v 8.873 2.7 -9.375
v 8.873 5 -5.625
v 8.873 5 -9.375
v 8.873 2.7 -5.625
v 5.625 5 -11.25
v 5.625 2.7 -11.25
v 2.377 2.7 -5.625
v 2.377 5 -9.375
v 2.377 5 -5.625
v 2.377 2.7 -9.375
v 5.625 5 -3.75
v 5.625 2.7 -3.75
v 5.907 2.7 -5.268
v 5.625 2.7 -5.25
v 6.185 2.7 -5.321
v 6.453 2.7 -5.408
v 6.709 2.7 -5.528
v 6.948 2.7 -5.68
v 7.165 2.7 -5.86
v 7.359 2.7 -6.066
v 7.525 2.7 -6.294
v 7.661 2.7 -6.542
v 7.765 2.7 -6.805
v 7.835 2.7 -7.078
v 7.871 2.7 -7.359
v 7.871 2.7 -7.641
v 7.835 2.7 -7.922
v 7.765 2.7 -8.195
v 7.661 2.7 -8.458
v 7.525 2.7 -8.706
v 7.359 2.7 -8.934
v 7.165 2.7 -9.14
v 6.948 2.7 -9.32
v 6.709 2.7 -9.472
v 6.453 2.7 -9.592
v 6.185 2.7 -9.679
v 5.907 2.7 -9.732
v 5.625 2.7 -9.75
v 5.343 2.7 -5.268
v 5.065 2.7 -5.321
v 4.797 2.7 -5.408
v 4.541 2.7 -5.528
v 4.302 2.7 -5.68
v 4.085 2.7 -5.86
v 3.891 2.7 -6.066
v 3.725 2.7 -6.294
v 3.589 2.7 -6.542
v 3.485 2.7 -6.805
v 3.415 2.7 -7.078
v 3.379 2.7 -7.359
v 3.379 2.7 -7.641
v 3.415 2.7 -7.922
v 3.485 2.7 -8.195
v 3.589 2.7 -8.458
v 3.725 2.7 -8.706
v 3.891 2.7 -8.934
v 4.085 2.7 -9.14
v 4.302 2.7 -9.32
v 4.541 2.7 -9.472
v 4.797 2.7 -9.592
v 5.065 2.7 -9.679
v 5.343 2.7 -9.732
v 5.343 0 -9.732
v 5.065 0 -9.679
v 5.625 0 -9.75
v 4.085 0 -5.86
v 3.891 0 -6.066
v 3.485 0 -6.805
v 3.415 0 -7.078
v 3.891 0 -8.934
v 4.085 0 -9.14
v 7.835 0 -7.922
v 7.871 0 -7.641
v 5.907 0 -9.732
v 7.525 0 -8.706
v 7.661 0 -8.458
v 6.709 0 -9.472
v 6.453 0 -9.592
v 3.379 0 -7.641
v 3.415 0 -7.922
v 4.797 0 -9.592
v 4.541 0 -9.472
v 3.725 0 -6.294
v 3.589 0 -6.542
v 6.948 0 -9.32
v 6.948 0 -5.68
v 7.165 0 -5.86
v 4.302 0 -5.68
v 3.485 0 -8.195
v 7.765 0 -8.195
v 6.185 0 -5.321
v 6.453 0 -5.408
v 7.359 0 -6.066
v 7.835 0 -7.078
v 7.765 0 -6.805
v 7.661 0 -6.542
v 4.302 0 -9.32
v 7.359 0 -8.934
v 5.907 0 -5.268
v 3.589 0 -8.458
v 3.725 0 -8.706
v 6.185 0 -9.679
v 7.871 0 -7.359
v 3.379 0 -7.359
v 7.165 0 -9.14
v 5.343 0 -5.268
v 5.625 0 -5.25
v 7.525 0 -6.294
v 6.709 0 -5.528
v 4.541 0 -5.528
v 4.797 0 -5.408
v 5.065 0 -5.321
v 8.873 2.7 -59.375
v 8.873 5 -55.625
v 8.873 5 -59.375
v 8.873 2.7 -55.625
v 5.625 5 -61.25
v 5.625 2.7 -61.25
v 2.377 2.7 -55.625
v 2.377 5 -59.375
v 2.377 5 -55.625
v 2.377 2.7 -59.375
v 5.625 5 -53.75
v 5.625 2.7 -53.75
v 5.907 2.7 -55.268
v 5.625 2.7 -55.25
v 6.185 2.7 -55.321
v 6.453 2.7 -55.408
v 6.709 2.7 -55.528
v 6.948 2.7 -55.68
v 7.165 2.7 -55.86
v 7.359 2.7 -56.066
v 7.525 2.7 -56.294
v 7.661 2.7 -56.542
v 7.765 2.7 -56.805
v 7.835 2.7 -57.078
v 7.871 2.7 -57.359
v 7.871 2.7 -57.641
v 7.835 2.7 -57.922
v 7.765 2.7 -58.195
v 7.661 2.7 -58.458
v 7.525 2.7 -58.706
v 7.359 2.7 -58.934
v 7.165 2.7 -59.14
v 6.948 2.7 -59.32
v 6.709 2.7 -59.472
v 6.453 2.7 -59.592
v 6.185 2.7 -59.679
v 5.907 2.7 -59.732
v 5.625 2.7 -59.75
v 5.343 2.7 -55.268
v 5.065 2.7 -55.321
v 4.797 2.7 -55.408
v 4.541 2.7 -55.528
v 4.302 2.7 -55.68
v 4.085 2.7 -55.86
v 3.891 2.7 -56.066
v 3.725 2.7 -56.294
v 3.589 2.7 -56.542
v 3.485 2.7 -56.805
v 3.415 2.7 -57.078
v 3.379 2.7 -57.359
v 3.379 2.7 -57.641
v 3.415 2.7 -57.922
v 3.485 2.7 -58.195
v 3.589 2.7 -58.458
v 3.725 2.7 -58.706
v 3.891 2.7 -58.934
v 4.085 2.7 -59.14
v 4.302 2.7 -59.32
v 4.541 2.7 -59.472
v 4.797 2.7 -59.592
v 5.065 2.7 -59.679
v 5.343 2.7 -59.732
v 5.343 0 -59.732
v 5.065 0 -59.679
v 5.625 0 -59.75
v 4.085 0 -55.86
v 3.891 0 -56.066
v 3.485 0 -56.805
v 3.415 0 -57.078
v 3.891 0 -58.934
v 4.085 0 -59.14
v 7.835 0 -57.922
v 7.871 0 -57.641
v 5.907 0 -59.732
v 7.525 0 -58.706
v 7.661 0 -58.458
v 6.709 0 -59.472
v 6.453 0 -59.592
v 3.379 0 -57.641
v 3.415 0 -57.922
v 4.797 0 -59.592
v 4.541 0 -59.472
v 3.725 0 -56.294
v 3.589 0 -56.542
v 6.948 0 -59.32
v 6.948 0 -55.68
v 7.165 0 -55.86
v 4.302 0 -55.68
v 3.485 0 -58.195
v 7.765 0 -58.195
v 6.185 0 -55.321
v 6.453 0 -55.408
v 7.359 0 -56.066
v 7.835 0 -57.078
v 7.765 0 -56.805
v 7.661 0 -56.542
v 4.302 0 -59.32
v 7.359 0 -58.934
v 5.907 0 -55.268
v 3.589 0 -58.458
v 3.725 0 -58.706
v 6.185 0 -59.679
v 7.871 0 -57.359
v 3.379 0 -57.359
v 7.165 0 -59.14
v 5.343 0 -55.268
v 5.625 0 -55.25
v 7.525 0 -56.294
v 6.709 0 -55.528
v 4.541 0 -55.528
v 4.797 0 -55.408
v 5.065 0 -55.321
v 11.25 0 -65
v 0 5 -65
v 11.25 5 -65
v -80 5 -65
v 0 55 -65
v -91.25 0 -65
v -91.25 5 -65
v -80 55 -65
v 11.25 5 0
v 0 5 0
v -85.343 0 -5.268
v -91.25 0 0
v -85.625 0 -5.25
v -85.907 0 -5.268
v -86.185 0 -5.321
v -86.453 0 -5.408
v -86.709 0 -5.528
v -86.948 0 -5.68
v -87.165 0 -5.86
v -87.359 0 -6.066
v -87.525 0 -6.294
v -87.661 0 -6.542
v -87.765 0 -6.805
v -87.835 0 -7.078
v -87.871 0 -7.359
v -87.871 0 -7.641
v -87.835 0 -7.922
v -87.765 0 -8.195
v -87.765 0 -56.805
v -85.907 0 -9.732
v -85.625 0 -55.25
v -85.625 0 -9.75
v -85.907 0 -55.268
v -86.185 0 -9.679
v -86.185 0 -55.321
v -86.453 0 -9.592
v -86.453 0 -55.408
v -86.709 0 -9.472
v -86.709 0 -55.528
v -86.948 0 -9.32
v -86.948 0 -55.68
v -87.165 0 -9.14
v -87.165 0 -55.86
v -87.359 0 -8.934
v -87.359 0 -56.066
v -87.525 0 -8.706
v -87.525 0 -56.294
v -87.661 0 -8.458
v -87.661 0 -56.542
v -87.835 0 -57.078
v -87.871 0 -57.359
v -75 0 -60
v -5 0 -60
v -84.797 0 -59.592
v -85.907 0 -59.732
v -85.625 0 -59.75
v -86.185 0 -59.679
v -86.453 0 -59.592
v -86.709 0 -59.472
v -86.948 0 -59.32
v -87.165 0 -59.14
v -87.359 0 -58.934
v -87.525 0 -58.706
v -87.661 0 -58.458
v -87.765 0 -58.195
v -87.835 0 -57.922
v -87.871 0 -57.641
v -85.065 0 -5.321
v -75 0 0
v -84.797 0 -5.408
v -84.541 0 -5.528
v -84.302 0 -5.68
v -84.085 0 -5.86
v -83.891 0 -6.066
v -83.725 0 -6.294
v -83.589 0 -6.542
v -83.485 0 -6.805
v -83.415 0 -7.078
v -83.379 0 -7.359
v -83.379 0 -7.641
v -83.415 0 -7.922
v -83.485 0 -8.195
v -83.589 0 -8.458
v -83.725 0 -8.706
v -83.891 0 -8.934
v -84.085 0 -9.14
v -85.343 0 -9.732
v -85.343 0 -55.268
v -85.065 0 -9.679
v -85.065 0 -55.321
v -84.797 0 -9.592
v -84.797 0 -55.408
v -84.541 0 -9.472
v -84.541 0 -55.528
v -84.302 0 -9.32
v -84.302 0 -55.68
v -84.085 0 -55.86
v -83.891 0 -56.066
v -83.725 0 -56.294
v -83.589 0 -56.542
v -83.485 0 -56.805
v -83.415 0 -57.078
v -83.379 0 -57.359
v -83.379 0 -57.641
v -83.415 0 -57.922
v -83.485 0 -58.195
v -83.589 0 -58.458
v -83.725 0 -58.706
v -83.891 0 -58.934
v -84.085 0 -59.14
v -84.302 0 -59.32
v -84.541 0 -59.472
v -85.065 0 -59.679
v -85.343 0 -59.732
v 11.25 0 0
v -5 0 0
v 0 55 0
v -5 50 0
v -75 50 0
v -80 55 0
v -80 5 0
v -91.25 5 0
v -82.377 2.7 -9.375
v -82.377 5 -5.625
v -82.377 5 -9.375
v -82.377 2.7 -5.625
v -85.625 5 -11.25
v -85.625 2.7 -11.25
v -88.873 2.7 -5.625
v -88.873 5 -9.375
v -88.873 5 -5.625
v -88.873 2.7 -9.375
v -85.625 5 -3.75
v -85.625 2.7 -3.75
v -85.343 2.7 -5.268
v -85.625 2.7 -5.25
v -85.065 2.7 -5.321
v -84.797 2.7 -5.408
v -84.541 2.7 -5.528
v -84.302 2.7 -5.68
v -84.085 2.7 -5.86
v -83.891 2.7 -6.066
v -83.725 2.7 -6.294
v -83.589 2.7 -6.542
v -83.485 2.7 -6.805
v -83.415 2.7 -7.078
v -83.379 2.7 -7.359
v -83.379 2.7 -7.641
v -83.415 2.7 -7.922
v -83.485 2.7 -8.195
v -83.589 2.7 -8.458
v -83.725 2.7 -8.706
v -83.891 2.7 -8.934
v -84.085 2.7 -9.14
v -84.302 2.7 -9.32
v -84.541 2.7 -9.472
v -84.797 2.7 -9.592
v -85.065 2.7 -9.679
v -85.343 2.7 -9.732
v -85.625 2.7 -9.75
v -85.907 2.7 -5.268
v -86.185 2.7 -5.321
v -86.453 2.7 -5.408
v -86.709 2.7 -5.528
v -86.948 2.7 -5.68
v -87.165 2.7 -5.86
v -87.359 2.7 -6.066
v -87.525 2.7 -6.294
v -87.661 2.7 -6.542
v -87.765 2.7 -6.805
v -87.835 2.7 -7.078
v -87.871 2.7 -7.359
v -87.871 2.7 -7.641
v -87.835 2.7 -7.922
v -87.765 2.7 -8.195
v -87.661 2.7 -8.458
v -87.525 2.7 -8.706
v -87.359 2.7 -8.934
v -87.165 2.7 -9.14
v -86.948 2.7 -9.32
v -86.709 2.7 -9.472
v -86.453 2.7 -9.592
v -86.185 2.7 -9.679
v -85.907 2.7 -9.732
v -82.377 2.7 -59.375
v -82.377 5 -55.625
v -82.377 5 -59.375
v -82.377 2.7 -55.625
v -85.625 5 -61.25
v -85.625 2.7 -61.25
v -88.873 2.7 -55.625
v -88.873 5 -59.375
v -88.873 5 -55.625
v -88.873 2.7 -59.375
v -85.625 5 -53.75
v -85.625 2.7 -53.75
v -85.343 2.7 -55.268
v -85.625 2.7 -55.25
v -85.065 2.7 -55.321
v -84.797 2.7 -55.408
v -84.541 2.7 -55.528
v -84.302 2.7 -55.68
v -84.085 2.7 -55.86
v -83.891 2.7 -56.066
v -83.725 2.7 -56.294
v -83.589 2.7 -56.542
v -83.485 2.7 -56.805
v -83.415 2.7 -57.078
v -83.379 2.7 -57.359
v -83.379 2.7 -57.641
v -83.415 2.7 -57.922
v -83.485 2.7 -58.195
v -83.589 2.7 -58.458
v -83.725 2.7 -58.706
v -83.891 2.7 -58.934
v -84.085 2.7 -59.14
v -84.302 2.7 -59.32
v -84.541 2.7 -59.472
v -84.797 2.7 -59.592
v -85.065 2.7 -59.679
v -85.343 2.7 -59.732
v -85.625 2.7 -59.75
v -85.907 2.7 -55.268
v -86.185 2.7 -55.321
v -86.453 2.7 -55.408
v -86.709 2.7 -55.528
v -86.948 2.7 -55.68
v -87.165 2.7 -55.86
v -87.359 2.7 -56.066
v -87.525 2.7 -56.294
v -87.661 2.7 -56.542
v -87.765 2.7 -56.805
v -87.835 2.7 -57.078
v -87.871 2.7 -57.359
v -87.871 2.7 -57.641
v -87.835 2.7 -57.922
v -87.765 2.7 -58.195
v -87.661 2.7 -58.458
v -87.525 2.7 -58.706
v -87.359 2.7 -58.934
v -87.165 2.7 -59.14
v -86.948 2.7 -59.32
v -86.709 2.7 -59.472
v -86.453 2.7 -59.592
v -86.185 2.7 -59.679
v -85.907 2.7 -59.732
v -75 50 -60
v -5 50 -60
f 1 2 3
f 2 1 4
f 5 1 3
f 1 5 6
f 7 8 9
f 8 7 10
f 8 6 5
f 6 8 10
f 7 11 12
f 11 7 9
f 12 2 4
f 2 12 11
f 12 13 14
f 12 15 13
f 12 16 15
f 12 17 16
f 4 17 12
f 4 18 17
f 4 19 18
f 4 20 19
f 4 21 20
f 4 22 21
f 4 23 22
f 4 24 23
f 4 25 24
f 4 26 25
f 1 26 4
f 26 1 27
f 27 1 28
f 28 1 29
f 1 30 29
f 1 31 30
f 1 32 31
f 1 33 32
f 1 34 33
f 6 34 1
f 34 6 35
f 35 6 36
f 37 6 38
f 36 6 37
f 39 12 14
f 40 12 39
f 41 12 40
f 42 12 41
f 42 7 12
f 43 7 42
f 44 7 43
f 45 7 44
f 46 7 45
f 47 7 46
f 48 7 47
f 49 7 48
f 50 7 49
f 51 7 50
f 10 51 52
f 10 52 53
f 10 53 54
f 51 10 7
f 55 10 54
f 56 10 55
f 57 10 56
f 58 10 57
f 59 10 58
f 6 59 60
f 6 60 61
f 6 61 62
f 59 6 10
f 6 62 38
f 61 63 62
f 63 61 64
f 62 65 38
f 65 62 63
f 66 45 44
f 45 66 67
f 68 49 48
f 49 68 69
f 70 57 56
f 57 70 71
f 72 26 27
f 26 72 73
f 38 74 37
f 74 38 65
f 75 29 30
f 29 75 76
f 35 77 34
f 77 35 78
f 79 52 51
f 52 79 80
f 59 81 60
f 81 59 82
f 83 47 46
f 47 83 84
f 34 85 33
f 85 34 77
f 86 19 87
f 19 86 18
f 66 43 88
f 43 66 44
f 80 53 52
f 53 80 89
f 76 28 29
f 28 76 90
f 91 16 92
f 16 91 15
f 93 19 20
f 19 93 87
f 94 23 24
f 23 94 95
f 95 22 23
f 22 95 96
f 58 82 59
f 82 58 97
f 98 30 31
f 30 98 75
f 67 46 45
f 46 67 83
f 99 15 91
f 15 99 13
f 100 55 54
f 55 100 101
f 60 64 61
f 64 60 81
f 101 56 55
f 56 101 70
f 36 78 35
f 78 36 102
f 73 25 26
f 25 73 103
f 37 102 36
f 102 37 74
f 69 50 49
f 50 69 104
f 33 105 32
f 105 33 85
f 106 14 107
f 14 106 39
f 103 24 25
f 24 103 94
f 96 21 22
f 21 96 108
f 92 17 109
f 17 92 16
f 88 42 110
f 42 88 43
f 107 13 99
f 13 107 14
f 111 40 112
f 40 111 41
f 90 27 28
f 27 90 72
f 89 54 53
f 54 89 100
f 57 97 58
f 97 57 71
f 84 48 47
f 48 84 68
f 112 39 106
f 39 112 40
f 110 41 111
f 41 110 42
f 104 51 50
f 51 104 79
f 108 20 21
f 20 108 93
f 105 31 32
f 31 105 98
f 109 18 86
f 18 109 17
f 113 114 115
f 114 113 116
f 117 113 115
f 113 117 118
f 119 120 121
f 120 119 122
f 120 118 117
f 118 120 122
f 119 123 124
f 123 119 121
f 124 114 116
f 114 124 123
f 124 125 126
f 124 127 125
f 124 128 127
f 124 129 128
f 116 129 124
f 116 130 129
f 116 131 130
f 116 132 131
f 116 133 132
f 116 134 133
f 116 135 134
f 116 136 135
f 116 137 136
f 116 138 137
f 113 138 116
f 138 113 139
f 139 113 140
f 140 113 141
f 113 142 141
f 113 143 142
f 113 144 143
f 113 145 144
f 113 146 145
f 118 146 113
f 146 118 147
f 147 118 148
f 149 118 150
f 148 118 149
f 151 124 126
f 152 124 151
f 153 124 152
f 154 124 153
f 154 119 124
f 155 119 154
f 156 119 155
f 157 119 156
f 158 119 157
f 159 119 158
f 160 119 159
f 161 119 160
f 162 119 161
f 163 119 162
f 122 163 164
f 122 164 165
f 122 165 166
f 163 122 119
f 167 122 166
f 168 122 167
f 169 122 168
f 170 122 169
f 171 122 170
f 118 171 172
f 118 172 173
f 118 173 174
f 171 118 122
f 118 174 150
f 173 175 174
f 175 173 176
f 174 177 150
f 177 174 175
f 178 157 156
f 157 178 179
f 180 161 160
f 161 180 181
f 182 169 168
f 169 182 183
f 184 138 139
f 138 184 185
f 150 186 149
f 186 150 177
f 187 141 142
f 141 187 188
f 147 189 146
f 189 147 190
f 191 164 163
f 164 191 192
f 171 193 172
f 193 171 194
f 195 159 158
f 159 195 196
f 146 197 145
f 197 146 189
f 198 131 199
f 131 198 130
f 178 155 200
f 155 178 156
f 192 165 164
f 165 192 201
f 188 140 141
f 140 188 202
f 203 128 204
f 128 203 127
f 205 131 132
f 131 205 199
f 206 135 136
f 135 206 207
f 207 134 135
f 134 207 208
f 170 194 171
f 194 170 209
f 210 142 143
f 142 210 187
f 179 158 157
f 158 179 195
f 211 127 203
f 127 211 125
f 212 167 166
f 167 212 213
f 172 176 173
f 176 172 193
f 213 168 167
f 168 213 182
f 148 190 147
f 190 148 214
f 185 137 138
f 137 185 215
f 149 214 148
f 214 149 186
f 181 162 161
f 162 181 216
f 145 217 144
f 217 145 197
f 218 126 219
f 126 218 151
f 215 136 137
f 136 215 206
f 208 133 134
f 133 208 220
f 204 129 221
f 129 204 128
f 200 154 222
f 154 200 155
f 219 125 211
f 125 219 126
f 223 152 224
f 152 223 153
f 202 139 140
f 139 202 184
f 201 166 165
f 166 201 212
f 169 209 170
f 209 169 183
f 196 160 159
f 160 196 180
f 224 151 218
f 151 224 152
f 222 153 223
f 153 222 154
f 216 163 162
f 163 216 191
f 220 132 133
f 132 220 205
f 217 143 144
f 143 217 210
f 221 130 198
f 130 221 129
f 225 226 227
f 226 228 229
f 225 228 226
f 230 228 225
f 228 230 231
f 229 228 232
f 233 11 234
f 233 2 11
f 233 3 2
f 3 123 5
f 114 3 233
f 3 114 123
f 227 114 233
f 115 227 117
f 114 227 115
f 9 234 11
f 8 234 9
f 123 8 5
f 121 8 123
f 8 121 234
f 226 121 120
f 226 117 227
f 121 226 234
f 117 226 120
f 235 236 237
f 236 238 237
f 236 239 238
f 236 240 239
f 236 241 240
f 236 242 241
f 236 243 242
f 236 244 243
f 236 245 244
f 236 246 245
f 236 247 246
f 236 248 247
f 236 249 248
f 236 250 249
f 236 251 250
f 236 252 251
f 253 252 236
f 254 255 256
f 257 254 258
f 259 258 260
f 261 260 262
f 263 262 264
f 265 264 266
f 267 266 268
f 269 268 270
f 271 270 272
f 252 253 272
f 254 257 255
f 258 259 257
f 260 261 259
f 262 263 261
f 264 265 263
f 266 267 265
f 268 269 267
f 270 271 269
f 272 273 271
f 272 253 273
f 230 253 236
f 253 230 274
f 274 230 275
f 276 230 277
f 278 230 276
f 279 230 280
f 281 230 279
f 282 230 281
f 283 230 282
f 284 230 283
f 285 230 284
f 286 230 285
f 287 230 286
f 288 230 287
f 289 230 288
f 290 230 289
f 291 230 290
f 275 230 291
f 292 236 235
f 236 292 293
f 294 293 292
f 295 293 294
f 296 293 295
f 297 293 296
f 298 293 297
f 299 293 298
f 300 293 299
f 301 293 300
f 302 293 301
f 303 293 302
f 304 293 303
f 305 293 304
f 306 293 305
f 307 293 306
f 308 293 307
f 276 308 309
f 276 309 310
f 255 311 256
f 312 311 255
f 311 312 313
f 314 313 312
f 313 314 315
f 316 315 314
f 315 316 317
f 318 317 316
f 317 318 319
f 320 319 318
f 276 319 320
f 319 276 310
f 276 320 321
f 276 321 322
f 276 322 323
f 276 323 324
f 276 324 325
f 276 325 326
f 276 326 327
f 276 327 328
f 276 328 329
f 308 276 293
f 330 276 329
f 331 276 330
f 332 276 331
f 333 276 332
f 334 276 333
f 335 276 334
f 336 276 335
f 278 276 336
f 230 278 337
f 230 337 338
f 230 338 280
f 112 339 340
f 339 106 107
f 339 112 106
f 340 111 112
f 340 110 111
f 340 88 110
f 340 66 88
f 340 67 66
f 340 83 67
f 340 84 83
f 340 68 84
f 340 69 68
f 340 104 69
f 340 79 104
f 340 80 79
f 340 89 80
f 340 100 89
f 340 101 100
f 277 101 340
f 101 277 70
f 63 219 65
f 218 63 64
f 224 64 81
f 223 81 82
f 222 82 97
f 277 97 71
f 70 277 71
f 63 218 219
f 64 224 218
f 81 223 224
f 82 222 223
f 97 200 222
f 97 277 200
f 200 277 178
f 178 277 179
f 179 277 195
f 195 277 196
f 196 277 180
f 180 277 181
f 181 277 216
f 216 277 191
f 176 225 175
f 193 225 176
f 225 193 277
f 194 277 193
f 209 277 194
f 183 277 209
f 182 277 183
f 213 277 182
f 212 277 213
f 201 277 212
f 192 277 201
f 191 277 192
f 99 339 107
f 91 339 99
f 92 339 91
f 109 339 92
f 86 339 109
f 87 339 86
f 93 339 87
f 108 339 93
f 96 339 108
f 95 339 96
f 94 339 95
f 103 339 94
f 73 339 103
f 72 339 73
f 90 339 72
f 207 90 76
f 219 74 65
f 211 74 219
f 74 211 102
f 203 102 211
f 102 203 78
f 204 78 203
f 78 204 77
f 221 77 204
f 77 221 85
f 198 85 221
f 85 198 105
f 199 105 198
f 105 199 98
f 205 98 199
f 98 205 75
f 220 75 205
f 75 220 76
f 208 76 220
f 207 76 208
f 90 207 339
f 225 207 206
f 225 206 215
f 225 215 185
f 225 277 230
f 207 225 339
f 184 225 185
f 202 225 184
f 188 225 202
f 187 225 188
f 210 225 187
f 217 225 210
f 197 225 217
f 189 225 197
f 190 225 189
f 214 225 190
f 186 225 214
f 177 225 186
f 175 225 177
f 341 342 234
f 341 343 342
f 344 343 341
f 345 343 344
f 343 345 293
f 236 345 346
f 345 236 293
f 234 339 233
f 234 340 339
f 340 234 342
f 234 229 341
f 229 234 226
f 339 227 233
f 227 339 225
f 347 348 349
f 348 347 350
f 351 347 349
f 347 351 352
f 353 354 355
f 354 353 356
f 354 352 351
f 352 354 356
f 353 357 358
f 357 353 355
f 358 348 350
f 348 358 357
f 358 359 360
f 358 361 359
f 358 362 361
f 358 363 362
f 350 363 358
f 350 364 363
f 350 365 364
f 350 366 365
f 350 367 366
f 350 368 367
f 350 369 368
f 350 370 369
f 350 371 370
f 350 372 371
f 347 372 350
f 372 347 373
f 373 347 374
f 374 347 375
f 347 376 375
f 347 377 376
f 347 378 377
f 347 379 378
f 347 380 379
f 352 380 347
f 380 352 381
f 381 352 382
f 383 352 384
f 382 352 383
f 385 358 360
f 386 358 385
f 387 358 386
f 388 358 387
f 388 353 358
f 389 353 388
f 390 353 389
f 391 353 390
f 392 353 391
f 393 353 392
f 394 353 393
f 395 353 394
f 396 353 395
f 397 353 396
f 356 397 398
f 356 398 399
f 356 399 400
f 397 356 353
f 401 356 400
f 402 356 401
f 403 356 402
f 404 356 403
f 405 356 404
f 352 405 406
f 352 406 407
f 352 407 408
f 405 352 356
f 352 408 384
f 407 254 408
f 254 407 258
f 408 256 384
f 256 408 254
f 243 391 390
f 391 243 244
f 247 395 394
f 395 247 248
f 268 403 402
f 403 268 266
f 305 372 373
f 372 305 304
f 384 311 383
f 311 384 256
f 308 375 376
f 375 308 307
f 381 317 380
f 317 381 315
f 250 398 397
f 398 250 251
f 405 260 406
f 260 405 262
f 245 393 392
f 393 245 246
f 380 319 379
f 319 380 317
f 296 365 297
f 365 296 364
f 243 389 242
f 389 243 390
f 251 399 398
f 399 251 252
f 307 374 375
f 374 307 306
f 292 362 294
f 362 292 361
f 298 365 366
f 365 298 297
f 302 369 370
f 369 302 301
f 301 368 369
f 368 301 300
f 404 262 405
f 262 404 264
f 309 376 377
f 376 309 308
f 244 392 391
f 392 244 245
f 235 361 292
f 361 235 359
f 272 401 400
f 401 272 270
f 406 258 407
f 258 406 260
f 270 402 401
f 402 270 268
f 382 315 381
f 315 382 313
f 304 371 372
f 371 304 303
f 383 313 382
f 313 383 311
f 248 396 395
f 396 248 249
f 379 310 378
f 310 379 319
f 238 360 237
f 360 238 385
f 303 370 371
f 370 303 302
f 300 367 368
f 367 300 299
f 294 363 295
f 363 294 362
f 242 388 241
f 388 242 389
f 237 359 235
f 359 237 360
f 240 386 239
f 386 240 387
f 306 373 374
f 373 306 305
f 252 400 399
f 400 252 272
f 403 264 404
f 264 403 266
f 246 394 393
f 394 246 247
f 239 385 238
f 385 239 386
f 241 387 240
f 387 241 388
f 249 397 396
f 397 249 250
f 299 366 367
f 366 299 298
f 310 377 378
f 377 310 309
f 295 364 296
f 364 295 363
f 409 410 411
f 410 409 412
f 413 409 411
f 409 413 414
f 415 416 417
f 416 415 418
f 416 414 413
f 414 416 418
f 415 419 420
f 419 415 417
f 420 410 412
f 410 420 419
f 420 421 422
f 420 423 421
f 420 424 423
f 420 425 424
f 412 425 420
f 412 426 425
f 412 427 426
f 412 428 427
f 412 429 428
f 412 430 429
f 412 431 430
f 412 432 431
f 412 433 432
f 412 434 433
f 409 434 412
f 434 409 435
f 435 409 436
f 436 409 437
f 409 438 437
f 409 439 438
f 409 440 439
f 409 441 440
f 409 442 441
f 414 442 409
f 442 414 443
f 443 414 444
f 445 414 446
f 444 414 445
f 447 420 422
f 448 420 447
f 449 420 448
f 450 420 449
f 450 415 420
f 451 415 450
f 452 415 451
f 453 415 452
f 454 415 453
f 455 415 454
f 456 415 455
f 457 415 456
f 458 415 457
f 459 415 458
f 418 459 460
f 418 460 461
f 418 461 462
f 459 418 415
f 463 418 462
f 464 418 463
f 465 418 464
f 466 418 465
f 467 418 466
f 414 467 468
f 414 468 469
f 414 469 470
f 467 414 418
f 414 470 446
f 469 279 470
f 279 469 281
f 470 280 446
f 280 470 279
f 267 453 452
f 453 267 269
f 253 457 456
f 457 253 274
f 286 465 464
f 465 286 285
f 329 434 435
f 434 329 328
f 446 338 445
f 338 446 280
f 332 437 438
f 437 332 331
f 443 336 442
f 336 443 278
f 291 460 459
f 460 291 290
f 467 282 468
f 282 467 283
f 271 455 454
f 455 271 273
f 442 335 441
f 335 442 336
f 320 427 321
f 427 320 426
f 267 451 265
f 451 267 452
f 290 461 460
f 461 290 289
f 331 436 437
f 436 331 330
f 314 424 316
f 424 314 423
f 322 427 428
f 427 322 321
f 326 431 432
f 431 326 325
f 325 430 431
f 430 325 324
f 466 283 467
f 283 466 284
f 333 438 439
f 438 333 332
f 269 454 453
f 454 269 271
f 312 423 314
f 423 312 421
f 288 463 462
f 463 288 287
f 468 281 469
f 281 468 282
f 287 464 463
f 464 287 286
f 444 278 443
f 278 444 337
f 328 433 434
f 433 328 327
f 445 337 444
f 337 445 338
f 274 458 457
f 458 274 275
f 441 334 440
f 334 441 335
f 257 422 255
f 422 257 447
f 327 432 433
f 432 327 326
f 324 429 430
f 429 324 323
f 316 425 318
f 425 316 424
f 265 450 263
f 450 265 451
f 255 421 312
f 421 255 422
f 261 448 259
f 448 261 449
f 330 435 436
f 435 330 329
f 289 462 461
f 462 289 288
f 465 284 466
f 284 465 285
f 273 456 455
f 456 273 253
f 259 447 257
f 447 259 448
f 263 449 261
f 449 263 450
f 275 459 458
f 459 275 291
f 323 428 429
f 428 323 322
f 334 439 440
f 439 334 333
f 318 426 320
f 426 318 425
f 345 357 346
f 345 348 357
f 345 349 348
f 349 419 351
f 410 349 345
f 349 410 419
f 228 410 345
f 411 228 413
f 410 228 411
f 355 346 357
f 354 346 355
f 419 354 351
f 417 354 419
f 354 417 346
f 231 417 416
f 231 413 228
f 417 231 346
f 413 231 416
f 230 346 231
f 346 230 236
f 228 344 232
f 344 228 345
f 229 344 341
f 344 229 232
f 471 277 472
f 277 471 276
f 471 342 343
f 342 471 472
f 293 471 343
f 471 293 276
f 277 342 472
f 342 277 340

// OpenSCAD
// Flush holder
// Copyright (C) 2016  Andre-Patrick Bubel <code@andre-bubel.de>
//
// This program is free software: you can redistribute it and/or modify
// it under the terms of the GNU General Public License as published by
// the Free Software Foundation, either version 3 of the License, or
// (at your option) any later version.
// 
// This program is distributed in the hope that it will be useful,
// but WITHOUT ANY WARRANTY; without even the implied warranty of
// MERCHANTABILITY or FITNESS FOR A PARTICULAR PURPOSE.  See the
// GNU General Public License for more details.
// 
// You should have received a copy of the GNU General Public License
// along with this program.  If not, see <http://www.gnu.org/licenses/>.
//
// This work is also licensed under a Creative Commons
// Attribution-ShareAlike 4.0 International License.

screw_hole_diameter = 4.5;

nut_width = 7.5;
nut_height = 3.2;

layer_height = 0.3;

case_inner_width = 60;
case_inner_height = 50;
case_inner_length = 70;

wall_thickness = 5;
fastening_plate_height = 5;

/* [Hidden] */
// how much puncher parts should overlap to avoid zero thickness leftovers
punch = 1000;

case_inner_dim_punch = [case_inner_width+punch, case_inner_length, case_inner_height+punch];

case_outer_width = case_inner_width + wall_thickness;
case_outer_height = case_inner_height + wall_thickness;
case_outer_length = case_inner_length + 2*wall_thickness;

case_outer_dim = [case_outer_width, case_outer_length, case_outer_height];

fastening_plate_length = 3/2 * nut_width;
fastening_plate_width = case_outer_width;
fastening_plate_height = nut_height + layer_height * 6;

fastening_plate_dim = [fastening_plate_width, fastening_plate_length, fastening_plate_height];

module hole_puncher() {
    union() {
        cylinder(punch, d = nut_width, $fn=6);
        translate([0,0,-punch+1])
        cylinder(punch, d = screw_hole_diameter);
    }
}

module fastening_plate() {
    difference() {
        cube(fastening_plate_dim);
        translate([nut_width, fastening_plate_length/2, layer_height * 9])
        hole_puncher();
        translate([fastening_plate_width - nut_width, fastening_plate_length/2, layer_height * 9])
        hole_puncher();        
    }
};

$fn = 50;

rotate([0,90,90])
difference() {
    union() {
        translate([0,-fastening_plate_length,0])
        fastening_plate();
        translate([0,case_outer_length,0])
        fastening_plate();    
        cube(case_outer_dim);
    }
    translate([-punch, wall_thickness, -punch])
    cube(case_inner_dim_punch);
}
